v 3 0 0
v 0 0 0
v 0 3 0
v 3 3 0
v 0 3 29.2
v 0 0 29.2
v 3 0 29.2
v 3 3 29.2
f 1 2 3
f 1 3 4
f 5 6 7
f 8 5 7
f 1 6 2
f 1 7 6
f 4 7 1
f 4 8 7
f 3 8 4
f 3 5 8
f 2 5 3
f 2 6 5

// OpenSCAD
module alg_next_each_other_x(count = 2, space = 10.00, center = true) {
    translate([center ? -space * count / 2 + space/2 : 0, 0, 0])
        for (offset = [0:count - 1])
            translate([offset * space, 0, 0])
                children();
}

module alg_next_each_other_y(count = 2, space = 10.00, center = true) {
    translate([0, center ? -space * count / 2 + space/2 : 0, 0])
        for (offset = [0:count - 1])
            translate([0, offset * space, 0])
                children();
}

module alg_next_each_other_x_squeze_in(count = 2, width = 10.00, size = 1.00, center = true) {
    alg_next_each_other_x(count, width / count / 2, center)
        children();
}

module grid(x = 1, y = 1) {
    alg_next_each_other_y(y)
        alg_next_each_other_x(x)
            children();
}


module window(size = [17.00, 23.60], h = 1.60, inner_t = 0.8, outer_t = 0.8, shutter_h = 0.60, shutter_right = 9.00, shutter_left = 9.00, shutter_top = 0.80, shutter_bottom = 0.40, with_segment = true) {
    
    linear_extrude(h + (with_shutter ? shutter_h : 0))
        union() {
            difference() {
                square(size, center = true);
                square([size[0] - outer_t * 2, size[1] - outer_t * 2], center = true);
            }
            
            if (with_segment)
                square([inner_t, size[1]], center = true);
        }
        
    linear_extrude(shutter_h) {
        if (shutter_left > 0)
            translate([size[0]/2 + shutter_left/2, 0, 0])
                square([shutter_left, size[1]], center = true);
        
        if (shutter_right > 0)
            translate([-size[0]/2 - shutter_right/2, 0, 0])
                square([shutter_right, size[1]], center = true);
        
        if (shutter_top)
            translate([(shutter_left - shutter_right) / 2, size[1]/2 + shutter_top/2 - 0.001, 0])
                square([size[0] + shutter_left + shutter_right, shutter_top], center = true);
        
        if (shutter_bottom)
            translate([(shutter_left - shutter_right) / 2, -size[1]/2 - shutter_bottom/2 - 0.001, 0])
                square([size[0] + shutter_left + shutter_right, shutter_bottom], center = true);
    }
}

//ok: window([18.20, 24.60]);
//ok: window([20.00, 25.00], with_shutter = false);

//ok: window([9.20, 24.60], h = 2.20, shutter_left = 0, with_segment = false);
//ok: window([16.00, 17.00], h = 2.20, shutter_right = 8.00, shutter_left = 8.00, with_segment = false);

//ok: window([18.20, 24.60], h = 2.20, shutter_right = 18.30, shutter_left = 0, with_segment = false);

//ok: window([20.00, 25.00], shutter_right = 0, shutter_left = 0, shutter_top = 0, shutter_bottom = 0, with_shutter = false);

//ok: window([8.00, 15.00], h = 2.20, shutter_right = 7.50, shutter_left = 0, with_segment = false);


//ok: window([9.00, 25.00], h = 2.40, shutter_right = 0, shutter_left = 9, with_segment = false);

//ok: window([6.70, 14.80], h = 2.40, shutter_right = 0, shutter_left = 6, with_segment = false, shutter_top = 0);

//ok: window([6.60, 13.40], h = 2.40, shutter_right = 0, shutter_left = 7, with_segment = false, shutter_top = 0);

//ok: window([7.80, 17.20], h = 2.40, shutter_right = 0, shutter_left = 7, with_segment = false);

//linear_extrude(0.8)
//    square([66, 29]);


linear_extrude(29.20)
    square([3, 3]);

/*
translate([18.00, 0, 0])
    window([15.10, 15.50]);

translate([18.00 + 15.50 + 4, 0, 0])
    window([19.30, 23.60]);
*/
